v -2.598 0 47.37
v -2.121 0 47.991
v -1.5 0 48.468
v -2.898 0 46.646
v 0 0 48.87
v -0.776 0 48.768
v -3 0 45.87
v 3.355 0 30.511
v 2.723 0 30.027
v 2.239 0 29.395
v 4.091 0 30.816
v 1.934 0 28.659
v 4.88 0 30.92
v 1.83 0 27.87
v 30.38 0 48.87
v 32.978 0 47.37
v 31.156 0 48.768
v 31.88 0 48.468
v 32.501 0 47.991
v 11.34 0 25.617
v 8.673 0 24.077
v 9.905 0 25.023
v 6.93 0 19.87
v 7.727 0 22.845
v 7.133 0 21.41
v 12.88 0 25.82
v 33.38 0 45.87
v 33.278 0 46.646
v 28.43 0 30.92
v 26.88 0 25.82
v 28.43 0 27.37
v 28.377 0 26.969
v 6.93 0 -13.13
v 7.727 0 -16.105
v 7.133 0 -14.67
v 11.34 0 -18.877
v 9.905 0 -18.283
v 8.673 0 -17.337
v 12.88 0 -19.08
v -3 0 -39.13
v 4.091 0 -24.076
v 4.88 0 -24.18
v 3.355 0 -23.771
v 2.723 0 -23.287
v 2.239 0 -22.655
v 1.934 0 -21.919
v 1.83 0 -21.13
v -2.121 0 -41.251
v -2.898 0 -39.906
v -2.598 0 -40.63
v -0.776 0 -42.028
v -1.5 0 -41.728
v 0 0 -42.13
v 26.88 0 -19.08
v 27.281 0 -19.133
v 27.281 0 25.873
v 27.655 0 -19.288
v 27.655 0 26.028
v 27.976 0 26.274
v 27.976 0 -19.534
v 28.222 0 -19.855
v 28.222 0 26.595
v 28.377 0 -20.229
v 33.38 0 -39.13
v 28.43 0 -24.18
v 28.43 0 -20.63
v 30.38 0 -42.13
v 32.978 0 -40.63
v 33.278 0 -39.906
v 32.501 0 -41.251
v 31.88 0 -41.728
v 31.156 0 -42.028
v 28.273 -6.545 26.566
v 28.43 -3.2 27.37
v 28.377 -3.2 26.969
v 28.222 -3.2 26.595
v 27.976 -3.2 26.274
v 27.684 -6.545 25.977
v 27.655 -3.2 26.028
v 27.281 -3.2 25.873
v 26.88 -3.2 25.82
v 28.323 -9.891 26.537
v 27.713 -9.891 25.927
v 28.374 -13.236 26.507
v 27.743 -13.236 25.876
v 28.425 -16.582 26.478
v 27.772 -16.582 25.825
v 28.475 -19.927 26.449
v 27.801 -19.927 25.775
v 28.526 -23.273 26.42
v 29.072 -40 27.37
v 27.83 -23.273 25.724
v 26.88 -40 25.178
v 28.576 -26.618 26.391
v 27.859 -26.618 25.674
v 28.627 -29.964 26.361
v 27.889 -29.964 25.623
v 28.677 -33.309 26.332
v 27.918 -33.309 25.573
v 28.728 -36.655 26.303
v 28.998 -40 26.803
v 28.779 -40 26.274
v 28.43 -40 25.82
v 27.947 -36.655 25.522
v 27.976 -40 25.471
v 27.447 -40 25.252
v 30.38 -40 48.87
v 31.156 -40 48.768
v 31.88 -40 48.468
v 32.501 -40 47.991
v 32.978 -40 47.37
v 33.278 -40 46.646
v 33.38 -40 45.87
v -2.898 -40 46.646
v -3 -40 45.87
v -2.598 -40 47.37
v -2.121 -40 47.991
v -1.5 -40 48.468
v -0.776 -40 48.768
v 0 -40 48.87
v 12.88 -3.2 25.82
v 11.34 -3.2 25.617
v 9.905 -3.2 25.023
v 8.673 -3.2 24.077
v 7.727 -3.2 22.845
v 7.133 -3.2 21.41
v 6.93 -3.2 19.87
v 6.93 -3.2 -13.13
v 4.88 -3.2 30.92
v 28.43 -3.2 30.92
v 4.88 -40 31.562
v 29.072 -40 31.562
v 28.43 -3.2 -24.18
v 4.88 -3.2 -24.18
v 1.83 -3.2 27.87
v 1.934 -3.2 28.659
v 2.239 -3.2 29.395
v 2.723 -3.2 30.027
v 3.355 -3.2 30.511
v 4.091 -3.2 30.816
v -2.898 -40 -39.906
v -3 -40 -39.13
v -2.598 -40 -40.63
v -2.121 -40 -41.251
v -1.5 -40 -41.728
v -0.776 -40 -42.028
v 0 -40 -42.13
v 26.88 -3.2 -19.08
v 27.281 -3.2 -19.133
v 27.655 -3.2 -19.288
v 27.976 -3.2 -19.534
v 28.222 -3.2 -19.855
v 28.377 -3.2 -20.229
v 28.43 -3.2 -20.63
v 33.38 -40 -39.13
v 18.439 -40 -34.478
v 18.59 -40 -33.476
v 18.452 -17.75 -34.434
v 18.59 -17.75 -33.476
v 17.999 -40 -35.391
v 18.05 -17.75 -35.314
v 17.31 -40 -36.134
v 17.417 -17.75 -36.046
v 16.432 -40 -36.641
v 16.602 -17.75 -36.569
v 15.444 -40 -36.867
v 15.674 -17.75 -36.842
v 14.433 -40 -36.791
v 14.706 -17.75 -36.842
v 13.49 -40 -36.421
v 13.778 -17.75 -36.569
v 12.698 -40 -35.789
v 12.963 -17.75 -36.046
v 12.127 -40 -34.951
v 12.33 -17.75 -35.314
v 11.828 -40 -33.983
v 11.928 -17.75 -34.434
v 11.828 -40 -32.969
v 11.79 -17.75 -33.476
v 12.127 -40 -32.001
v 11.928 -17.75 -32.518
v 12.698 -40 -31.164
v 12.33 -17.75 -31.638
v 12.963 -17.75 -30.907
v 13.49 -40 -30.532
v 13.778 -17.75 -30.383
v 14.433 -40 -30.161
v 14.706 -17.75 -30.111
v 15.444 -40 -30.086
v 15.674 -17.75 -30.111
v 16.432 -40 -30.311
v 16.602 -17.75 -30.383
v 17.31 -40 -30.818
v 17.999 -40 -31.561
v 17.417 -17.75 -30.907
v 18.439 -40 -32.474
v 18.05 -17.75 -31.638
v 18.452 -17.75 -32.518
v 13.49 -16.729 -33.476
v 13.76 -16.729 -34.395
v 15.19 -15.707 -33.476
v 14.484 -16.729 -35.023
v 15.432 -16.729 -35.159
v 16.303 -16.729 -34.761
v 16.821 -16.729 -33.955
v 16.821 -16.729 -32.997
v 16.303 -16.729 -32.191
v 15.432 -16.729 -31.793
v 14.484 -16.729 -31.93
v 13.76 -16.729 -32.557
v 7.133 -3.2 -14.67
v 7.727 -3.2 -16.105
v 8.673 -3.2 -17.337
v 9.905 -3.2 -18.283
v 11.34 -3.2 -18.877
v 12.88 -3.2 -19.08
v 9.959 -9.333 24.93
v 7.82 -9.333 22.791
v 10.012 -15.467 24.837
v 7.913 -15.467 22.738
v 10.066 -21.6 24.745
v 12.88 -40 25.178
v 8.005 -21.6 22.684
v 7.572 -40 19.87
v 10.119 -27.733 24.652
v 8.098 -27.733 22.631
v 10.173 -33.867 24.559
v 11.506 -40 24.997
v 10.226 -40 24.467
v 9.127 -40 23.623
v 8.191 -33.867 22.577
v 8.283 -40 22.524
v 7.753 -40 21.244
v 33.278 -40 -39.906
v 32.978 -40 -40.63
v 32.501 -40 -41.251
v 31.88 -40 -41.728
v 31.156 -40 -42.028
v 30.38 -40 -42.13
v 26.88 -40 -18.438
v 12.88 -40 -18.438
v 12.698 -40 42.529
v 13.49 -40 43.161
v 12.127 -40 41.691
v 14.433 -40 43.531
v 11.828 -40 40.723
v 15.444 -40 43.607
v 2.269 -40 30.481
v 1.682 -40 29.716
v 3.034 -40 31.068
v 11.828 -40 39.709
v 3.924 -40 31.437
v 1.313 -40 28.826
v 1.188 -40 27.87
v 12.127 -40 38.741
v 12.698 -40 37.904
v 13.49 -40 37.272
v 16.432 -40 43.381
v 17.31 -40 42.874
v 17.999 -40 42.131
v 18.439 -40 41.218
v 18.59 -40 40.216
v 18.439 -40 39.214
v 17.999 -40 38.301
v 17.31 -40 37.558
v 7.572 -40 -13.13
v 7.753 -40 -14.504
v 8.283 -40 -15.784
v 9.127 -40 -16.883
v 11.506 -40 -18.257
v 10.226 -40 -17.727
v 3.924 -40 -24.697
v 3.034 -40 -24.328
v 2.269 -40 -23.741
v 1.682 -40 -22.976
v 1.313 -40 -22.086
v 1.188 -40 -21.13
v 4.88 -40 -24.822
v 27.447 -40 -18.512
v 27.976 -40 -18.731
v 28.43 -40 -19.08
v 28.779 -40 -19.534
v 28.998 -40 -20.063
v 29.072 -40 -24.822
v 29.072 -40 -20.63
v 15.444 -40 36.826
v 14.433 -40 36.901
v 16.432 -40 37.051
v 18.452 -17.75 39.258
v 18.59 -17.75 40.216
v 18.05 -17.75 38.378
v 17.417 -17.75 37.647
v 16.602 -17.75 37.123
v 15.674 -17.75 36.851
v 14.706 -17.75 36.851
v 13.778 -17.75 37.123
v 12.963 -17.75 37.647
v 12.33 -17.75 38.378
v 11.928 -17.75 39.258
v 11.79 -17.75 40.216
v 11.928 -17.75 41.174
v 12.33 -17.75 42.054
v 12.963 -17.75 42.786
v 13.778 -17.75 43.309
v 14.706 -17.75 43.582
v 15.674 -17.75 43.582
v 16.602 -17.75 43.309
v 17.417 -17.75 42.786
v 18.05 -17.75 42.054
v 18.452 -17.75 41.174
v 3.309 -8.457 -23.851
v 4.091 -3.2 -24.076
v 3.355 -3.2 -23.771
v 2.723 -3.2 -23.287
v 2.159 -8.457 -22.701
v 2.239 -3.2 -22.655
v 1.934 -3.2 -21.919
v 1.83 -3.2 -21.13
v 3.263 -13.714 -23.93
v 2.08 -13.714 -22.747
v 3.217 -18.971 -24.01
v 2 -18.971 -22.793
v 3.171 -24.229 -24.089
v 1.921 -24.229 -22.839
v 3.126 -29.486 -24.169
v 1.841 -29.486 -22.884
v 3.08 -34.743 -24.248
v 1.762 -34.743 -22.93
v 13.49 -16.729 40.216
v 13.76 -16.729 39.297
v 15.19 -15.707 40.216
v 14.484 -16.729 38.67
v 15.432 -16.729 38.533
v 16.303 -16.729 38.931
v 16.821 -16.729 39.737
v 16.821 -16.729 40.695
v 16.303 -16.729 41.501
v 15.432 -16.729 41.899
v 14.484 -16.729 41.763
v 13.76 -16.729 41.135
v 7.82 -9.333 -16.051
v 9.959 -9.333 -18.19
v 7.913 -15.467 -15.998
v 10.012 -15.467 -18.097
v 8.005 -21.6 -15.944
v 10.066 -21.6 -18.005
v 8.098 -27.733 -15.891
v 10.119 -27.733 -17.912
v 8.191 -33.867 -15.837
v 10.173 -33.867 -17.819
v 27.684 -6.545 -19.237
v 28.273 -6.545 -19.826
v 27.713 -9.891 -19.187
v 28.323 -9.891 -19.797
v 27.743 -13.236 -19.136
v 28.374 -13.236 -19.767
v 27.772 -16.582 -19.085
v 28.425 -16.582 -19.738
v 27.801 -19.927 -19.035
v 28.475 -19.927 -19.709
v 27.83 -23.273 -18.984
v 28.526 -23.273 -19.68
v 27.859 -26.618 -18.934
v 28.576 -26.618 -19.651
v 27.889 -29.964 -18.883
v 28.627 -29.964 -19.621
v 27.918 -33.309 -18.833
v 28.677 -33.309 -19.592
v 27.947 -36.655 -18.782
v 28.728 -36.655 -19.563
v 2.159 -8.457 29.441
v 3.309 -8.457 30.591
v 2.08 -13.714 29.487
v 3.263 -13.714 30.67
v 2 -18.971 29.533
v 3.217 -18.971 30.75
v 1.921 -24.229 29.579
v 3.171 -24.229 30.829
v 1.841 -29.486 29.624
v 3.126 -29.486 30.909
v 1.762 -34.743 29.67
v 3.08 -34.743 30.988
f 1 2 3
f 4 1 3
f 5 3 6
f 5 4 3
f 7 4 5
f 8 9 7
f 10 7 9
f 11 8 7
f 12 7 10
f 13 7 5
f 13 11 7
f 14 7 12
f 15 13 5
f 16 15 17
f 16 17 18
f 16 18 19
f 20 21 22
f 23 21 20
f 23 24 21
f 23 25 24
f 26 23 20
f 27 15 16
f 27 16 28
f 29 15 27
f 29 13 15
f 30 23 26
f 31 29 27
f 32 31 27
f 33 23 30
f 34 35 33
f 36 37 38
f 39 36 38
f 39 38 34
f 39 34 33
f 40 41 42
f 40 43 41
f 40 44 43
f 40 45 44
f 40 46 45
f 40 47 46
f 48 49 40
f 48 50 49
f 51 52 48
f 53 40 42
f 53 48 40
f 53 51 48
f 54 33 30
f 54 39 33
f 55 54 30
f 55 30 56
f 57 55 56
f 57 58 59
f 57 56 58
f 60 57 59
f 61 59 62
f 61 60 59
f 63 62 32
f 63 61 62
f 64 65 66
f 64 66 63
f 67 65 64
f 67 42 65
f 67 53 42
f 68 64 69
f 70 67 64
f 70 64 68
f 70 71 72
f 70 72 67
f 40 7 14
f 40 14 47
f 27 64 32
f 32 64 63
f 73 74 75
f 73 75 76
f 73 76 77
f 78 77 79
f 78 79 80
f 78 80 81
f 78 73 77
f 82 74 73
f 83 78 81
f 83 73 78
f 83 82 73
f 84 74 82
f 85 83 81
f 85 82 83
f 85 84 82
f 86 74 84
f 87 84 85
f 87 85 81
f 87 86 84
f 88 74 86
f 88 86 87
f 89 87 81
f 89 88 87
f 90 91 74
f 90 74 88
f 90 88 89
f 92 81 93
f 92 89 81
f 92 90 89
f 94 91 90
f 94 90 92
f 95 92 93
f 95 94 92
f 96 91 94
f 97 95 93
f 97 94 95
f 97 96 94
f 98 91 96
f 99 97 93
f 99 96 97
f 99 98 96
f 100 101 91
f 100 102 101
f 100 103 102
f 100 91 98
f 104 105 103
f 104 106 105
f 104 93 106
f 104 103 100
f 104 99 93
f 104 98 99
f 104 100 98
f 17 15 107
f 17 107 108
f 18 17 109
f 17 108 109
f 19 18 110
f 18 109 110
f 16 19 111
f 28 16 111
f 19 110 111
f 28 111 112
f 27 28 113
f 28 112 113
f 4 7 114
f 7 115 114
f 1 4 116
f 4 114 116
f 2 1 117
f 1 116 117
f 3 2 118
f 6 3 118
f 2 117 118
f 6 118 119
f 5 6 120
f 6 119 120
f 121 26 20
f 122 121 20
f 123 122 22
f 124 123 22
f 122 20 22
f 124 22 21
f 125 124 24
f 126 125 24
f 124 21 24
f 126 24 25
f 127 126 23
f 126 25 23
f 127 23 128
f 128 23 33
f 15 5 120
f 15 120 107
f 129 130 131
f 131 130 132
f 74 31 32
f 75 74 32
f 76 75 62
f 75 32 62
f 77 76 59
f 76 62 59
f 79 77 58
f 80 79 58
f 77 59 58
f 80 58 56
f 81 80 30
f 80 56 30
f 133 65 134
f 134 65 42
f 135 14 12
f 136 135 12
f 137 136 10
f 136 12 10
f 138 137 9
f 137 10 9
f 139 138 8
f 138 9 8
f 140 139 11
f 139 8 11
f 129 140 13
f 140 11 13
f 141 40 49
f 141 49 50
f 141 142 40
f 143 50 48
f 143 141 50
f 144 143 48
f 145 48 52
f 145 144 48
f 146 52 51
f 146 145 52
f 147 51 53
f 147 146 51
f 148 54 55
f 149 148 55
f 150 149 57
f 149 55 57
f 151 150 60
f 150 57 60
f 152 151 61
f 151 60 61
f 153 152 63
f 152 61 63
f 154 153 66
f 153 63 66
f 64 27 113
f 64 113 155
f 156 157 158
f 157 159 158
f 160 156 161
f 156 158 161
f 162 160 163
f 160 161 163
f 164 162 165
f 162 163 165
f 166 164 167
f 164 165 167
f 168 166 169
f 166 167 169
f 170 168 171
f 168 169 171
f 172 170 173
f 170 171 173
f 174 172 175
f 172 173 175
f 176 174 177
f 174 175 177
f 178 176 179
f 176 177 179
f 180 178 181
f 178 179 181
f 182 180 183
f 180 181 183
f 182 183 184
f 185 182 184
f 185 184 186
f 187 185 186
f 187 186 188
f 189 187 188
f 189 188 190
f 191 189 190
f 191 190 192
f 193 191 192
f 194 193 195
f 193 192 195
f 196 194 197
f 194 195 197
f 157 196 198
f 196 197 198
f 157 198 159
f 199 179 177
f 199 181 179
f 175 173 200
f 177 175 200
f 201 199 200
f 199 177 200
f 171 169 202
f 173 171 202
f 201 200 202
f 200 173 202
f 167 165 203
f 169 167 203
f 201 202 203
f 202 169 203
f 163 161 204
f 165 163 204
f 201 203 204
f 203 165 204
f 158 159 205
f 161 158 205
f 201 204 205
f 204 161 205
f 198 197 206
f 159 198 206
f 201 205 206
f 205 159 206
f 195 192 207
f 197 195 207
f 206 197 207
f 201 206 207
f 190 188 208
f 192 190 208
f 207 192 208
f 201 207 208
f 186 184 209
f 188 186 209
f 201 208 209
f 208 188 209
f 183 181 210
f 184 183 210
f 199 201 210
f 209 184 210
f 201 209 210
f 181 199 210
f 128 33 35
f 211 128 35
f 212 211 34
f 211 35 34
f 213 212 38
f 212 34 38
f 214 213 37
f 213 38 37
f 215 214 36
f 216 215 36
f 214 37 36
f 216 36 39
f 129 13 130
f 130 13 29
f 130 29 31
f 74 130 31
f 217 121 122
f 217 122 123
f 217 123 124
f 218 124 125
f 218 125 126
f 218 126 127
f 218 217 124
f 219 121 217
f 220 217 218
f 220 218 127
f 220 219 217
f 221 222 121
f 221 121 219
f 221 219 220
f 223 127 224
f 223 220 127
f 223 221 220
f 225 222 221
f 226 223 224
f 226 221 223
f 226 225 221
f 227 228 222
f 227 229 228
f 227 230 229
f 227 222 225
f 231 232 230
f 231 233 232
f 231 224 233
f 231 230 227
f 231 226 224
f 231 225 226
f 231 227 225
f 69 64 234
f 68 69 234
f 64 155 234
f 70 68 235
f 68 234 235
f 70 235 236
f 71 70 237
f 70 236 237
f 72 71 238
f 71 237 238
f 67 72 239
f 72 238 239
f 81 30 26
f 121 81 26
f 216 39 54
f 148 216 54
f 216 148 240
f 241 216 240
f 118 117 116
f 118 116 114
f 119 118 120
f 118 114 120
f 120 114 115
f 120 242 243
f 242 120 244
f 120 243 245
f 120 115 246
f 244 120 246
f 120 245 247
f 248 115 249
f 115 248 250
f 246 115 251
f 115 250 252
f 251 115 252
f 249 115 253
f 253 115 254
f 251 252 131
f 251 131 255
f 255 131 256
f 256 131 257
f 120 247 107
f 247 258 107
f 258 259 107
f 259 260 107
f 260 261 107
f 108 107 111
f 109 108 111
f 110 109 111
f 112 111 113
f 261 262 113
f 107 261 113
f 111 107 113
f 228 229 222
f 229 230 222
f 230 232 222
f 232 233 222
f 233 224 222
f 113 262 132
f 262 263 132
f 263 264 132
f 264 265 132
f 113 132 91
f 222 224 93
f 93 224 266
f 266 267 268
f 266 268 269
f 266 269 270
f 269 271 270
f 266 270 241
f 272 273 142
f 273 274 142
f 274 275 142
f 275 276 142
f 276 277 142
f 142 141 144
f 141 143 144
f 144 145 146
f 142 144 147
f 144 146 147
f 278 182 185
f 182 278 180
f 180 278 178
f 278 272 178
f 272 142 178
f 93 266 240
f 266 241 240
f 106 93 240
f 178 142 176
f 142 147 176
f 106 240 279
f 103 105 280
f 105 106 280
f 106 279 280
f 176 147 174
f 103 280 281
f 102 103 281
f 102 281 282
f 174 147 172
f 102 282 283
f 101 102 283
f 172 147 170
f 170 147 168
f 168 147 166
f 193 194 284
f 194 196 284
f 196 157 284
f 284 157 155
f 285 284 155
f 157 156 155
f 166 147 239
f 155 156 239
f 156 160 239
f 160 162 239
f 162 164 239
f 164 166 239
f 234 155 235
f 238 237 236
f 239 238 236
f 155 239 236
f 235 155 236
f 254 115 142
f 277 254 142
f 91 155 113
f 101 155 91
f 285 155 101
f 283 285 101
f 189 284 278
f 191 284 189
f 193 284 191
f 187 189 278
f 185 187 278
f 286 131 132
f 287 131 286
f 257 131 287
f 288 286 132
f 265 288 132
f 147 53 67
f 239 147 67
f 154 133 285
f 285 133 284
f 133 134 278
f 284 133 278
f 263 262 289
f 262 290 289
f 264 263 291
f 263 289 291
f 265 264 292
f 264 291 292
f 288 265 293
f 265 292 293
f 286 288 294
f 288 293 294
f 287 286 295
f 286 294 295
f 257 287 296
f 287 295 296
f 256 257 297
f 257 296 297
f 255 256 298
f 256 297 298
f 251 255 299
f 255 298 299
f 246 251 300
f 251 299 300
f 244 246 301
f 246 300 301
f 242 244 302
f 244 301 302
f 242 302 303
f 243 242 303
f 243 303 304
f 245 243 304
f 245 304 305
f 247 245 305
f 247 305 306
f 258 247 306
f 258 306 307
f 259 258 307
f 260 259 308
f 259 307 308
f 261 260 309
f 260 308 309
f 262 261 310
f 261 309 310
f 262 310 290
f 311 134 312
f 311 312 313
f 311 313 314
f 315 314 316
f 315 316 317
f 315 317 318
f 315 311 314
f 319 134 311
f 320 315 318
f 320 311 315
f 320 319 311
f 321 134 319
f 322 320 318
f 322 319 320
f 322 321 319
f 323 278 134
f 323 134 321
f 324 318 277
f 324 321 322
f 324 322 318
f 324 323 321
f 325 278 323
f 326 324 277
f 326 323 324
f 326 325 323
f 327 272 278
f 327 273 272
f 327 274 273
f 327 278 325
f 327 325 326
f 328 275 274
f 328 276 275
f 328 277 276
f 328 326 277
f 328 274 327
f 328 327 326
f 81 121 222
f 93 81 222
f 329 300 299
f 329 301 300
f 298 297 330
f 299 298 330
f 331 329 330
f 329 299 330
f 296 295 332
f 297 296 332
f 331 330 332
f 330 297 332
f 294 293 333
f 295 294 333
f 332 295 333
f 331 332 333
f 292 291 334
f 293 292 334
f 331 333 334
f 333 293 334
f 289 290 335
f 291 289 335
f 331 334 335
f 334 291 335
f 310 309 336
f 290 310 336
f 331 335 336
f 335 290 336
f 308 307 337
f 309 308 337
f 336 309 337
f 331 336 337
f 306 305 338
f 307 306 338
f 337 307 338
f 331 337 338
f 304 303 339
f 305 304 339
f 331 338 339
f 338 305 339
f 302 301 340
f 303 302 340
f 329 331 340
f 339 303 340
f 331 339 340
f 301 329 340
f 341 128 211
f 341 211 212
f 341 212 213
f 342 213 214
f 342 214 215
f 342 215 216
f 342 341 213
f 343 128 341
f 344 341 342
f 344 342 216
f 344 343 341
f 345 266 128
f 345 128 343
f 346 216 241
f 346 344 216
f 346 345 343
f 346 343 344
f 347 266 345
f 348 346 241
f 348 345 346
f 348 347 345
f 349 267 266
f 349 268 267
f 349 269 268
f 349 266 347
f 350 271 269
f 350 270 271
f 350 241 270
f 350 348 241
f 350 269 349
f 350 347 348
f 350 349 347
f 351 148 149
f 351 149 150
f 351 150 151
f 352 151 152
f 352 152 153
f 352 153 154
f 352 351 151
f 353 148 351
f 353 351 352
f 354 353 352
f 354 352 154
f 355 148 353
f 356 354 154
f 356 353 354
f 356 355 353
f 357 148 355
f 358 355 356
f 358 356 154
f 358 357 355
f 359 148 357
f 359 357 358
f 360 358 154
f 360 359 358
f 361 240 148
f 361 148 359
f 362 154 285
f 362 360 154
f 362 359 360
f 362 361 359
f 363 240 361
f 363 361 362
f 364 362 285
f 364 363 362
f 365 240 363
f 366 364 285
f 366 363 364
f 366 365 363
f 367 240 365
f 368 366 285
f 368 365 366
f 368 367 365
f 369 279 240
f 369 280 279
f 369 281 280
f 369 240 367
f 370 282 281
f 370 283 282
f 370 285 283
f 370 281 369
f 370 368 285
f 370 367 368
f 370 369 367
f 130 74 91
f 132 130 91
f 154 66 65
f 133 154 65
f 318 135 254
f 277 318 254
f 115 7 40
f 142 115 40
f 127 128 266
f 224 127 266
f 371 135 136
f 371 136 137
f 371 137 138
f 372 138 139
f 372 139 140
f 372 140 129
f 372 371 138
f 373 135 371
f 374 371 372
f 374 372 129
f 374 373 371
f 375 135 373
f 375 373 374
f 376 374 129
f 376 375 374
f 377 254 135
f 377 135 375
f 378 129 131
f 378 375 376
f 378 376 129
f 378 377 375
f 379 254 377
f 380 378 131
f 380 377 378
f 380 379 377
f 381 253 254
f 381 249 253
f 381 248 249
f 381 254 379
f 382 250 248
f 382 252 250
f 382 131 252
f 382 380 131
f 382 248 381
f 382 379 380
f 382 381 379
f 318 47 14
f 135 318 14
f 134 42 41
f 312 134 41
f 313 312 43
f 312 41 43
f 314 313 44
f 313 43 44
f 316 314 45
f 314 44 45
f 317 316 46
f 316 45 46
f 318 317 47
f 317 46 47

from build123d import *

# Parameters (mm, degrees)
SKETCH1_W             = 36.38
SKETCH1_H             = 91
BOSS_EXTRUDE1_DEPTH   = 40
FILLET1_R             = 3
CUT_EXTRUDE1_REACH    = 73.432
M8_TAPPED_HOLE1_D     = 6.8
M8_TAPPED_HOLE1_DEPTH = 22.25
M8_TAPPED_HOLE1_TIP   = 2.042926105


with BuildPart() as part:
    # Sketch1 → Boss-Extrude1 (new body)
    with BuildSketch(Plane(origin=(0, 0, 0), x_dir=(1, 0, 0), z_dir=(0, 1, 0))):
        with Locations((15.19, -3.37)):
            Rectangle(SKETCH1_W, SKETCH1_H)
    extrude(amount=-BOSS_EXTRUDE1_DEPTH)

    # Fillet1
    fillet1_edges = [part.edges().sort_by_distance(p)[0] for p in [
        (33.38, -20, 48.87),
        (-3, -20, 48.87),
        (-3, -20, -42.13),
        (33.38, -20, -42.13),
    ]]
    fillet(fillet1_edges, radius=FILLET1_R)

    # Sketch2 → Cut-Extrude1 (cut, up to next)
    with BuildSketch(Plane(origin=(0, 0, 0), x_dir=(1, 0, 0), z_dir=(0, 1, 0)), mode=Mode.PRIVATE) as cut_extrude1_sk1:
        with BuildLine():
            Line((28.43, 24.18), (4.88, 24.18))
            ThreePointArc((4.88, 24.18), (2.723324317, 23.286675683), (1.83, 21.13))
            Line((1.83, 21.13), (1.83, -27.87))
            ThreePointArc((1.83, -27.87), (2.723324317, -30.026675683), (4.88, -30.92))
            Line((4.88, -30.92), (28.43, -30.92))
            Line((28.43, -30.92), (28.43, -27.37))
            ThreePointArc((28.43, -27.37), (27.976015511, -26.273984489), (26.88, -25.82))
            Line((26.88, -25.82), (12.88, -25.82))
            ThreePointArc((12.88, -25.82), (8.672714652, -24.077285348), (6.93, -19.87))
            Line((6.93, -19.87), (6.93, 13.13))
            ThreePointArc((6.93, 13.13), (8.672714652, 17.337285348), (12.88, 19.08))
            Line((12.88, 19.08), (26.88, 19.08))
            ThreePointArc((26.88, 19.08), (27.976015511, 19.533984489), (28.43, 20.63))
            Line((28.43, 20.63), (28.43, 24.18))
        make_face()
    cut_extrude1_tool1 = extrude(cut_extrude1_sk1.sketch, amount=-CUT_EXTRUDE1_REACH, mode=Mode.PRIVATE) & part.part
    add(cut_extrude1_tool1.solids().sort_by_distance((6.318153, 0, 3.37))[0], mode=Mode.SUBTRACT)

    # Cut-Sweep1: sweep along a path in Sketch4
    with BuildLine(Plane(origin=(0, 0, 0), x_dir=(1, 0, 0), z_dir=(0, 1, 0))) as cut_sweep1_path:
        Line((28.43, 20.63), (28.43, 24.18))
        Line((28.43, 24.18), (4.88, 24.18))
        ThreePointArc((4.88, 24.18), (2.723324317, 23.286675683), (1.83, 21.13))
        Line((1.83, 21.13), (1.83, -27.87))
        ThreePointArc((1.83, -27.87), (2.723324317, -30.026675683), (4.88, -30.92))
        Line((4.88, -30.92), (28.43, -30.92))
        Line((28.43, -30.92), (28.43, -27.37))
        ThreePointArc((28.43, -27.37), (27.976015511, -26.273984489), (26.88, -25.82))
        Line((26.88, -25.82), (12.88, -25.82))
        ThreePointArc((12.88, -25.82), (8.672714652, -24.077285348), (6.93, -19.87))
        Line((6.93, -19.87), (6.93, 13.13))
        ThreePointArc((6.93, 13.13), (8.672714652, 17.337285348), (12.88, 19.08))
        Line((12.88, 19.08), (26.88, 19.08))
        ThreePointArc((26.88, 19.08), (27.976015511, 19.533984489), (28.43, 20.63))
    # Sketch3 → Cut-Sweep1 (sweep, cut)
    with BuildSketch(Plane.XY):
        Polygon((1.83, -3.2), (1.187653611, -40), (1.83, -40), align=None)
    sweep(path=cut_sweep1_path.line, transition=Transition.RIGHT, mode=Mode.SUBTRACT)

    # M8 Tapped Hole1
    with Locations(Plane(origin=(0, -40, 0), x_dir=(-1, 0, 0), z_dir=(0, -1, 0))):
        with Locations((-15.19, 33.476173195), (-15.19, -40.216173195)):
            Hole(M8_TAPPED_HOLE1_D / 2, depth=M8_TAPPED_HOLE1_DEPTH)
            with Locations((0, 0, -(M8_TAPPED_HOLE1_DEPTH + M8_TAPPED_HOLE1_TIP / 2))):  # 118° drill point
                Cone(0, M8_TAPPED_HOLE1_D / 2, M8_TAPPED_HOLE1_TIP, mode=Mode.SUBTRACT)


solid = part.part
